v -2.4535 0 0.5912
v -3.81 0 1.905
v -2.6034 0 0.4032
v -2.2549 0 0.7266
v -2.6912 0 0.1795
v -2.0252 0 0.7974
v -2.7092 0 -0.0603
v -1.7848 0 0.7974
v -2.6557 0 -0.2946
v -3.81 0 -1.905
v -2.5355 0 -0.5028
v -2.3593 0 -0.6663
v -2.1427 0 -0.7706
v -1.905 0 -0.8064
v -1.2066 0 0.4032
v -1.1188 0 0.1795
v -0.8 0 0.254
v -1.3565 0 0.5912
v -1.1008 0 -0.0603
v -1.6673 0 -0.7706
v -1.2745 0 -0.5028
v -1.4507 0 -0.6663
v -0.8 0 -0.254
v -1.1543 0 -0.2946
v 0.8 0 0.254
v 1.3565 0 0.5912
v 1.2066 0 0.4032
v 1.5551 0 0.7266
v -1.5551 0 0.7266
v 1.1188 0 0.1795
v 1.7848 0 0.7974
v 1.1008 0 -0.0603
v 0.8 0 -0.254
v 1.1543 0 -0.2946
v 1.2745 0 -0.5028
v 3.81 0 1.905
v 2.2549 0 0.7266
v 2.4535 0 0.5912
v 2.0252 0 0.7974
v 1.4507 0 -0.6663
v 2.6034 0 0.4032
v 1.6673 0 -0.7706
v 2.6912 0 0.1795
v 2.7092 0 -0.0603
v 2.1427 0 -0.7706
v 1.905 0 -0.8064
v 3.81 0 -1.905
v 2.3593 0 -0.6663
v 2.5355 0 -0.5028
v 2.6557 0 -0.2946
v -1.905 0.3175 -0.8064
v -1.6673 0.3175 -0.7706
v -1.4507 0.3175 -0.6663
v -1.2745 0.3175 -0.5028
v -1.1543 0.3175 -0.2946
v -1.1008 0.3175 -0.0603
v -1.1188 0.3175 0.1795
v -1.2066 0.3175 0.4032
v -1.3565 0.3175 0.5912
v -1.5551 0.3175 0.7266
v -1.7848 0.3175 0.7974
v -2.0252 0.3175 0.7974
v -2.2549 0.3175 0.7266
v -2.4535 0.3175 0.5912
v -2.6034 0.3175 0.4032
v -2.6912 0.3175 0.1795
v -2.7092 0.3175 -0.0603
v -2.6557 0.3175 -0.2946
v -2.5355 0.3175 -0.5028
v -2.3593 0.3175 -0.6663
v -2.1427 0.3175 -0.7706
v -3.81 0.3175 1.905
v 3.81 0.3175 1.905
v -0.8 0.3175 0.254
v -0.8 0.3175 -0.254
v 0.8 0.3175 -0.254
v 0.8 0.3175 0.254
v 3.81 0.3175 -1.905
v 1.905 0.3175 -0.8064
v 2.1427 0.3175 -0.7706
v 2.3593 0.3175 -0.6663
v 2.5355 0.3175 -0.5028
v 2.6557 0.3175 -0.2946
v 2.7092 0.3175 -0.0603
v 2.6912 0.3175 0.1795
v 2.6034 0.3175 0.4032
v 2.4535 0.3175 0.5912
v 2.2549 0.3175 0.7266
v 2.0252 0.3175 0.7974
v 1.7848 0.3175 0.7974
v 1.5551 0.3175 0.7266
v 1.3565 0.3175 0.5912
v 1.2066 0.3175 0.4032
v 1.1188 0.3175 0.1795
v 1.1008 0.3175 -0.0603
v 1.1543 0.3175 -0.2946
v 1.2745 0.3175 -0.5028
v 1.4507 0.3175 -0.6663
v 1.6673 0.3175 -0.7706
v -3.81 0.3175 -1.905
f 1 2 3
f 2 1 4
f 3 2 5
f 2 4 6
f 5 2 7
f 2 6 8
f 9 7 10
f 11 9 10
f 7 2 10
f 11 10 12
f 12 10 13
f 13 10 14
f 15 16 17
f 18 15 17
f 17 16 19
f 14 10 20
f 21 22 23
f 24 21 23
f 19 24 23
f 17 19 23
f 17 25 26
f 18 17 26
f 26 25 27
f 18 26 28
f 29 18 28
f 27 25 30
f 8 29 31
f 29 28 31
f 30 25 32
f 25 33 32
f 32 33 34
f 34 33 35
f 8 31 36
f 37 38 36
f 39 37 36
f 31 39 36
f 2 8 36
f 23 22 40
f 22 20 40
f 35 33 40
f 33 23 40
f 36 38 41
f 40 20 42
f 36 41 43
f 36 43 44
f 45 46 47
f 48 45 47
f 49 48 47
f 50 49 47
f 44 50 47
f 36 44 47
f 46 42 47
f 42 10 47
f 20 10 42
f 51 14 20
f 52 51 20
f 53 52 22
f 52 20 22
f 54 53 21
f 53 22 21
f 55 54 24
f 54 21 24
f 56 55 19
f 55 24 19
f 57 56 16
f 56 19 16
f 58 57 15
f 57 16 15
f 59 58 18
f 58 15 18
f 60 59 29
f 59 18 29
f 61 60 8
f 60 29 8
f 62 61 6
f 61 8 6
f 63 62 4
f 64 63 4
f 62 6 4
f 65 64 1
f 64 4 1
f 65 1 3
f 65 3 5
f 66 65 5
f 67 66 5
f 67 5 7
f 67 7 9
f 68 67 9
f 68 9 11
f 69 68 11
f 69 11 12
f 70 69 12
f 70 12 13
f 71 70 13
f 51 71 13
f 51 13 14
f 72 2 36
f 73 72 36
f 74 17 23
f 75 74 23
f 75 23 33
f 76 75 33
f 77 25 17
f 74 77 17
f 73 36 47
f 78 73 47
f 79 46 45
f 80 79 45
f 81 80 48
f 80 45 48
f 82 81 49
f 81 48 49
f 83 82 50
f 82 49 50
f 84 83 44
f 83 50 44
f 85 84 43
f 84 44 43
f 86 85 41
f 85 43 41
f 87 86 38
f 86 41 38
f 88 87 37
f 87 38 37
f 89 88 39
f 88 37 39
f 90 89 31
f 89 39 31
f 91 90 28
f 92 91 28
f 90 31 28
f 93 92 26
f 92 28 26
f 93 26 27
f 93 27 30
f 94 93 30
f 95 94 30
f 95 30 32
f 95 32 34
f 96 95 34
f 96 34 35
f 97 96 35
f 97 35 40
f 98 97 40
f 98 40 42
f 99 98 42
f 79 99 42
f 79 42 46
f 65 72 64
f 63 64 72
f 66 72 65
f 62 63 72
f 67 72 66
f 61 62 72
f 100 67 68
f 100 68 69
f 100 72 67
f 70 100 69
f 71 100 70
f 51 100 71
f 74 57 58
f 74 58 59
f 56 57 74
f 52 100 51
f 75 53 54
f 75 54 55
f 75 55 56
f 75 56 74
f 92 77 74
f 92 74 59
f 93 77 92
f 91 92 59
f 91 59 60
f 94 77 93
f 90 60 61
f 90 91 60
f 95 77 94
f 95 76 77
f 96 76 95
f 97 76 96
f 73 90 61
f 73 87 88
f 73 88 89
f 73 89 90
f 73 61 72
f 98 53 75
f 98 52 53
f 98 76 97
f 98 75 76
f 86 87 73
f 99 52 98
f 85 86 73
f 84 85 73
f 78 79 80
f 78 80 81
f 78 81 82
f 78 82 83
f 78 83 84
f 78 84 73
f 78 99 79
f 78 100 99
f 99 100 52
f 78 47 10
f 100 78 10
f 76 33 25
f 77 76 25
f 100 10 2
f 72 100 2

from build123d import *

# Parameters (mm, degrees)
BOSS_EXTRUDE1_DEPTH       = 0.3175
F_0_CLEARANCE_HOLE1_D     = 1.6129
F_0_CLEARANCE_HOLE1_DEPTH = 6.35
F_0_CLEARANCE_HOLE1_TIP   = 0.676691898


with BuildPart() as part:
    # Sketch1 → Boss-Extrude1 (new body)
    with BuildSketch(Plane(origin=(0, 0, 0), x_dir=(1, 0, 0), z_dir=(0, 1, 0))):
        with BuildLine():
            ThreePointArc((1.736526379, 0), (1.905, 0.168473621), (2.073473621, 0))
            Line((2.073473621, 0), (3.81, 0))
            Line((3.81, 0), (3.81, 1.905))
            Line((3.81, 1.905), (-3.81, 1.905))
            Line((-3.81, 1.905), (-3.81, 0))
            Line((-3.81, 0), (-2.064971223, 0))
            ThreePointArc((-2.064971223, 0), (-1.905, 0.159971223), (-1.745028777, 0))
            Line((-1.745028777, 0), (-0.8, 0))
            Line((-0.8, 0), (-0.8, 0.254))
            Line((-0.8, 0.254), (0.8, 0.254))
            Line((0.8, 0.254), (0.8, 0))
            Line((0.8, 0), (1.736526379, 0))
        make_face()
        with BuildLine():
            Line((3.81, 0), (2.073473621, 0))
            ThreePointArc((2.073473621, 0), (1.905, -0.168473621), (1.736526379, 0))
            Line((1.736526379, 0), (0.8, 0))
            Line((0.8, 0), (0.8, -0.254))
            Line((0.8, -0.254), (-0.8, -0.254))
            Line((-0.8, -0.254), (-0.8, 0))
            Line((-0.8, 0), (-1.745028777, 0))
            ThreePointArc((-1.745028777, 0), (-1.905, -0.159971223), (-2.064971223, 0))
            Line((-2.064971223, 0), (-3.81, 0))
            Line((-3.81, 0), (-3.81, -1.905))
            Line((-3.81, -1.905), (3.81, -1.905))
            Line((3.81, -1.905), (3.81, 0))
        make_face()
    extrude(amount=BOSS_EXTRUDE1_DEPTH)

    # #0 Clearance Hole1
    with Locations(Plane(origin=(-1.905, 0.3175, 0), x_dir=(0, 0, 1), z_dir=(0, 1, 0))):
        with Locations((0, 0), (0, 3.81)):
            Hole(F_0_CLEARANCE_HOLE1_D / 2, depth=F_0_CLEARANCE_HOLE1_DEPTH)
            with Locations((0, 0, -(F_0_CLEARANCE_HOLE1_DEPTH + F_0_CLEARANCE_HOLE1_TIP / 2))):  # 100° drill point
                Cone(0, F_0_CLEARANCE_HOLE1_D / 2, F_0_CLEARANCE_HOLE1_TIP, mode=Mode.SUBTRACT)


solid = part.part
